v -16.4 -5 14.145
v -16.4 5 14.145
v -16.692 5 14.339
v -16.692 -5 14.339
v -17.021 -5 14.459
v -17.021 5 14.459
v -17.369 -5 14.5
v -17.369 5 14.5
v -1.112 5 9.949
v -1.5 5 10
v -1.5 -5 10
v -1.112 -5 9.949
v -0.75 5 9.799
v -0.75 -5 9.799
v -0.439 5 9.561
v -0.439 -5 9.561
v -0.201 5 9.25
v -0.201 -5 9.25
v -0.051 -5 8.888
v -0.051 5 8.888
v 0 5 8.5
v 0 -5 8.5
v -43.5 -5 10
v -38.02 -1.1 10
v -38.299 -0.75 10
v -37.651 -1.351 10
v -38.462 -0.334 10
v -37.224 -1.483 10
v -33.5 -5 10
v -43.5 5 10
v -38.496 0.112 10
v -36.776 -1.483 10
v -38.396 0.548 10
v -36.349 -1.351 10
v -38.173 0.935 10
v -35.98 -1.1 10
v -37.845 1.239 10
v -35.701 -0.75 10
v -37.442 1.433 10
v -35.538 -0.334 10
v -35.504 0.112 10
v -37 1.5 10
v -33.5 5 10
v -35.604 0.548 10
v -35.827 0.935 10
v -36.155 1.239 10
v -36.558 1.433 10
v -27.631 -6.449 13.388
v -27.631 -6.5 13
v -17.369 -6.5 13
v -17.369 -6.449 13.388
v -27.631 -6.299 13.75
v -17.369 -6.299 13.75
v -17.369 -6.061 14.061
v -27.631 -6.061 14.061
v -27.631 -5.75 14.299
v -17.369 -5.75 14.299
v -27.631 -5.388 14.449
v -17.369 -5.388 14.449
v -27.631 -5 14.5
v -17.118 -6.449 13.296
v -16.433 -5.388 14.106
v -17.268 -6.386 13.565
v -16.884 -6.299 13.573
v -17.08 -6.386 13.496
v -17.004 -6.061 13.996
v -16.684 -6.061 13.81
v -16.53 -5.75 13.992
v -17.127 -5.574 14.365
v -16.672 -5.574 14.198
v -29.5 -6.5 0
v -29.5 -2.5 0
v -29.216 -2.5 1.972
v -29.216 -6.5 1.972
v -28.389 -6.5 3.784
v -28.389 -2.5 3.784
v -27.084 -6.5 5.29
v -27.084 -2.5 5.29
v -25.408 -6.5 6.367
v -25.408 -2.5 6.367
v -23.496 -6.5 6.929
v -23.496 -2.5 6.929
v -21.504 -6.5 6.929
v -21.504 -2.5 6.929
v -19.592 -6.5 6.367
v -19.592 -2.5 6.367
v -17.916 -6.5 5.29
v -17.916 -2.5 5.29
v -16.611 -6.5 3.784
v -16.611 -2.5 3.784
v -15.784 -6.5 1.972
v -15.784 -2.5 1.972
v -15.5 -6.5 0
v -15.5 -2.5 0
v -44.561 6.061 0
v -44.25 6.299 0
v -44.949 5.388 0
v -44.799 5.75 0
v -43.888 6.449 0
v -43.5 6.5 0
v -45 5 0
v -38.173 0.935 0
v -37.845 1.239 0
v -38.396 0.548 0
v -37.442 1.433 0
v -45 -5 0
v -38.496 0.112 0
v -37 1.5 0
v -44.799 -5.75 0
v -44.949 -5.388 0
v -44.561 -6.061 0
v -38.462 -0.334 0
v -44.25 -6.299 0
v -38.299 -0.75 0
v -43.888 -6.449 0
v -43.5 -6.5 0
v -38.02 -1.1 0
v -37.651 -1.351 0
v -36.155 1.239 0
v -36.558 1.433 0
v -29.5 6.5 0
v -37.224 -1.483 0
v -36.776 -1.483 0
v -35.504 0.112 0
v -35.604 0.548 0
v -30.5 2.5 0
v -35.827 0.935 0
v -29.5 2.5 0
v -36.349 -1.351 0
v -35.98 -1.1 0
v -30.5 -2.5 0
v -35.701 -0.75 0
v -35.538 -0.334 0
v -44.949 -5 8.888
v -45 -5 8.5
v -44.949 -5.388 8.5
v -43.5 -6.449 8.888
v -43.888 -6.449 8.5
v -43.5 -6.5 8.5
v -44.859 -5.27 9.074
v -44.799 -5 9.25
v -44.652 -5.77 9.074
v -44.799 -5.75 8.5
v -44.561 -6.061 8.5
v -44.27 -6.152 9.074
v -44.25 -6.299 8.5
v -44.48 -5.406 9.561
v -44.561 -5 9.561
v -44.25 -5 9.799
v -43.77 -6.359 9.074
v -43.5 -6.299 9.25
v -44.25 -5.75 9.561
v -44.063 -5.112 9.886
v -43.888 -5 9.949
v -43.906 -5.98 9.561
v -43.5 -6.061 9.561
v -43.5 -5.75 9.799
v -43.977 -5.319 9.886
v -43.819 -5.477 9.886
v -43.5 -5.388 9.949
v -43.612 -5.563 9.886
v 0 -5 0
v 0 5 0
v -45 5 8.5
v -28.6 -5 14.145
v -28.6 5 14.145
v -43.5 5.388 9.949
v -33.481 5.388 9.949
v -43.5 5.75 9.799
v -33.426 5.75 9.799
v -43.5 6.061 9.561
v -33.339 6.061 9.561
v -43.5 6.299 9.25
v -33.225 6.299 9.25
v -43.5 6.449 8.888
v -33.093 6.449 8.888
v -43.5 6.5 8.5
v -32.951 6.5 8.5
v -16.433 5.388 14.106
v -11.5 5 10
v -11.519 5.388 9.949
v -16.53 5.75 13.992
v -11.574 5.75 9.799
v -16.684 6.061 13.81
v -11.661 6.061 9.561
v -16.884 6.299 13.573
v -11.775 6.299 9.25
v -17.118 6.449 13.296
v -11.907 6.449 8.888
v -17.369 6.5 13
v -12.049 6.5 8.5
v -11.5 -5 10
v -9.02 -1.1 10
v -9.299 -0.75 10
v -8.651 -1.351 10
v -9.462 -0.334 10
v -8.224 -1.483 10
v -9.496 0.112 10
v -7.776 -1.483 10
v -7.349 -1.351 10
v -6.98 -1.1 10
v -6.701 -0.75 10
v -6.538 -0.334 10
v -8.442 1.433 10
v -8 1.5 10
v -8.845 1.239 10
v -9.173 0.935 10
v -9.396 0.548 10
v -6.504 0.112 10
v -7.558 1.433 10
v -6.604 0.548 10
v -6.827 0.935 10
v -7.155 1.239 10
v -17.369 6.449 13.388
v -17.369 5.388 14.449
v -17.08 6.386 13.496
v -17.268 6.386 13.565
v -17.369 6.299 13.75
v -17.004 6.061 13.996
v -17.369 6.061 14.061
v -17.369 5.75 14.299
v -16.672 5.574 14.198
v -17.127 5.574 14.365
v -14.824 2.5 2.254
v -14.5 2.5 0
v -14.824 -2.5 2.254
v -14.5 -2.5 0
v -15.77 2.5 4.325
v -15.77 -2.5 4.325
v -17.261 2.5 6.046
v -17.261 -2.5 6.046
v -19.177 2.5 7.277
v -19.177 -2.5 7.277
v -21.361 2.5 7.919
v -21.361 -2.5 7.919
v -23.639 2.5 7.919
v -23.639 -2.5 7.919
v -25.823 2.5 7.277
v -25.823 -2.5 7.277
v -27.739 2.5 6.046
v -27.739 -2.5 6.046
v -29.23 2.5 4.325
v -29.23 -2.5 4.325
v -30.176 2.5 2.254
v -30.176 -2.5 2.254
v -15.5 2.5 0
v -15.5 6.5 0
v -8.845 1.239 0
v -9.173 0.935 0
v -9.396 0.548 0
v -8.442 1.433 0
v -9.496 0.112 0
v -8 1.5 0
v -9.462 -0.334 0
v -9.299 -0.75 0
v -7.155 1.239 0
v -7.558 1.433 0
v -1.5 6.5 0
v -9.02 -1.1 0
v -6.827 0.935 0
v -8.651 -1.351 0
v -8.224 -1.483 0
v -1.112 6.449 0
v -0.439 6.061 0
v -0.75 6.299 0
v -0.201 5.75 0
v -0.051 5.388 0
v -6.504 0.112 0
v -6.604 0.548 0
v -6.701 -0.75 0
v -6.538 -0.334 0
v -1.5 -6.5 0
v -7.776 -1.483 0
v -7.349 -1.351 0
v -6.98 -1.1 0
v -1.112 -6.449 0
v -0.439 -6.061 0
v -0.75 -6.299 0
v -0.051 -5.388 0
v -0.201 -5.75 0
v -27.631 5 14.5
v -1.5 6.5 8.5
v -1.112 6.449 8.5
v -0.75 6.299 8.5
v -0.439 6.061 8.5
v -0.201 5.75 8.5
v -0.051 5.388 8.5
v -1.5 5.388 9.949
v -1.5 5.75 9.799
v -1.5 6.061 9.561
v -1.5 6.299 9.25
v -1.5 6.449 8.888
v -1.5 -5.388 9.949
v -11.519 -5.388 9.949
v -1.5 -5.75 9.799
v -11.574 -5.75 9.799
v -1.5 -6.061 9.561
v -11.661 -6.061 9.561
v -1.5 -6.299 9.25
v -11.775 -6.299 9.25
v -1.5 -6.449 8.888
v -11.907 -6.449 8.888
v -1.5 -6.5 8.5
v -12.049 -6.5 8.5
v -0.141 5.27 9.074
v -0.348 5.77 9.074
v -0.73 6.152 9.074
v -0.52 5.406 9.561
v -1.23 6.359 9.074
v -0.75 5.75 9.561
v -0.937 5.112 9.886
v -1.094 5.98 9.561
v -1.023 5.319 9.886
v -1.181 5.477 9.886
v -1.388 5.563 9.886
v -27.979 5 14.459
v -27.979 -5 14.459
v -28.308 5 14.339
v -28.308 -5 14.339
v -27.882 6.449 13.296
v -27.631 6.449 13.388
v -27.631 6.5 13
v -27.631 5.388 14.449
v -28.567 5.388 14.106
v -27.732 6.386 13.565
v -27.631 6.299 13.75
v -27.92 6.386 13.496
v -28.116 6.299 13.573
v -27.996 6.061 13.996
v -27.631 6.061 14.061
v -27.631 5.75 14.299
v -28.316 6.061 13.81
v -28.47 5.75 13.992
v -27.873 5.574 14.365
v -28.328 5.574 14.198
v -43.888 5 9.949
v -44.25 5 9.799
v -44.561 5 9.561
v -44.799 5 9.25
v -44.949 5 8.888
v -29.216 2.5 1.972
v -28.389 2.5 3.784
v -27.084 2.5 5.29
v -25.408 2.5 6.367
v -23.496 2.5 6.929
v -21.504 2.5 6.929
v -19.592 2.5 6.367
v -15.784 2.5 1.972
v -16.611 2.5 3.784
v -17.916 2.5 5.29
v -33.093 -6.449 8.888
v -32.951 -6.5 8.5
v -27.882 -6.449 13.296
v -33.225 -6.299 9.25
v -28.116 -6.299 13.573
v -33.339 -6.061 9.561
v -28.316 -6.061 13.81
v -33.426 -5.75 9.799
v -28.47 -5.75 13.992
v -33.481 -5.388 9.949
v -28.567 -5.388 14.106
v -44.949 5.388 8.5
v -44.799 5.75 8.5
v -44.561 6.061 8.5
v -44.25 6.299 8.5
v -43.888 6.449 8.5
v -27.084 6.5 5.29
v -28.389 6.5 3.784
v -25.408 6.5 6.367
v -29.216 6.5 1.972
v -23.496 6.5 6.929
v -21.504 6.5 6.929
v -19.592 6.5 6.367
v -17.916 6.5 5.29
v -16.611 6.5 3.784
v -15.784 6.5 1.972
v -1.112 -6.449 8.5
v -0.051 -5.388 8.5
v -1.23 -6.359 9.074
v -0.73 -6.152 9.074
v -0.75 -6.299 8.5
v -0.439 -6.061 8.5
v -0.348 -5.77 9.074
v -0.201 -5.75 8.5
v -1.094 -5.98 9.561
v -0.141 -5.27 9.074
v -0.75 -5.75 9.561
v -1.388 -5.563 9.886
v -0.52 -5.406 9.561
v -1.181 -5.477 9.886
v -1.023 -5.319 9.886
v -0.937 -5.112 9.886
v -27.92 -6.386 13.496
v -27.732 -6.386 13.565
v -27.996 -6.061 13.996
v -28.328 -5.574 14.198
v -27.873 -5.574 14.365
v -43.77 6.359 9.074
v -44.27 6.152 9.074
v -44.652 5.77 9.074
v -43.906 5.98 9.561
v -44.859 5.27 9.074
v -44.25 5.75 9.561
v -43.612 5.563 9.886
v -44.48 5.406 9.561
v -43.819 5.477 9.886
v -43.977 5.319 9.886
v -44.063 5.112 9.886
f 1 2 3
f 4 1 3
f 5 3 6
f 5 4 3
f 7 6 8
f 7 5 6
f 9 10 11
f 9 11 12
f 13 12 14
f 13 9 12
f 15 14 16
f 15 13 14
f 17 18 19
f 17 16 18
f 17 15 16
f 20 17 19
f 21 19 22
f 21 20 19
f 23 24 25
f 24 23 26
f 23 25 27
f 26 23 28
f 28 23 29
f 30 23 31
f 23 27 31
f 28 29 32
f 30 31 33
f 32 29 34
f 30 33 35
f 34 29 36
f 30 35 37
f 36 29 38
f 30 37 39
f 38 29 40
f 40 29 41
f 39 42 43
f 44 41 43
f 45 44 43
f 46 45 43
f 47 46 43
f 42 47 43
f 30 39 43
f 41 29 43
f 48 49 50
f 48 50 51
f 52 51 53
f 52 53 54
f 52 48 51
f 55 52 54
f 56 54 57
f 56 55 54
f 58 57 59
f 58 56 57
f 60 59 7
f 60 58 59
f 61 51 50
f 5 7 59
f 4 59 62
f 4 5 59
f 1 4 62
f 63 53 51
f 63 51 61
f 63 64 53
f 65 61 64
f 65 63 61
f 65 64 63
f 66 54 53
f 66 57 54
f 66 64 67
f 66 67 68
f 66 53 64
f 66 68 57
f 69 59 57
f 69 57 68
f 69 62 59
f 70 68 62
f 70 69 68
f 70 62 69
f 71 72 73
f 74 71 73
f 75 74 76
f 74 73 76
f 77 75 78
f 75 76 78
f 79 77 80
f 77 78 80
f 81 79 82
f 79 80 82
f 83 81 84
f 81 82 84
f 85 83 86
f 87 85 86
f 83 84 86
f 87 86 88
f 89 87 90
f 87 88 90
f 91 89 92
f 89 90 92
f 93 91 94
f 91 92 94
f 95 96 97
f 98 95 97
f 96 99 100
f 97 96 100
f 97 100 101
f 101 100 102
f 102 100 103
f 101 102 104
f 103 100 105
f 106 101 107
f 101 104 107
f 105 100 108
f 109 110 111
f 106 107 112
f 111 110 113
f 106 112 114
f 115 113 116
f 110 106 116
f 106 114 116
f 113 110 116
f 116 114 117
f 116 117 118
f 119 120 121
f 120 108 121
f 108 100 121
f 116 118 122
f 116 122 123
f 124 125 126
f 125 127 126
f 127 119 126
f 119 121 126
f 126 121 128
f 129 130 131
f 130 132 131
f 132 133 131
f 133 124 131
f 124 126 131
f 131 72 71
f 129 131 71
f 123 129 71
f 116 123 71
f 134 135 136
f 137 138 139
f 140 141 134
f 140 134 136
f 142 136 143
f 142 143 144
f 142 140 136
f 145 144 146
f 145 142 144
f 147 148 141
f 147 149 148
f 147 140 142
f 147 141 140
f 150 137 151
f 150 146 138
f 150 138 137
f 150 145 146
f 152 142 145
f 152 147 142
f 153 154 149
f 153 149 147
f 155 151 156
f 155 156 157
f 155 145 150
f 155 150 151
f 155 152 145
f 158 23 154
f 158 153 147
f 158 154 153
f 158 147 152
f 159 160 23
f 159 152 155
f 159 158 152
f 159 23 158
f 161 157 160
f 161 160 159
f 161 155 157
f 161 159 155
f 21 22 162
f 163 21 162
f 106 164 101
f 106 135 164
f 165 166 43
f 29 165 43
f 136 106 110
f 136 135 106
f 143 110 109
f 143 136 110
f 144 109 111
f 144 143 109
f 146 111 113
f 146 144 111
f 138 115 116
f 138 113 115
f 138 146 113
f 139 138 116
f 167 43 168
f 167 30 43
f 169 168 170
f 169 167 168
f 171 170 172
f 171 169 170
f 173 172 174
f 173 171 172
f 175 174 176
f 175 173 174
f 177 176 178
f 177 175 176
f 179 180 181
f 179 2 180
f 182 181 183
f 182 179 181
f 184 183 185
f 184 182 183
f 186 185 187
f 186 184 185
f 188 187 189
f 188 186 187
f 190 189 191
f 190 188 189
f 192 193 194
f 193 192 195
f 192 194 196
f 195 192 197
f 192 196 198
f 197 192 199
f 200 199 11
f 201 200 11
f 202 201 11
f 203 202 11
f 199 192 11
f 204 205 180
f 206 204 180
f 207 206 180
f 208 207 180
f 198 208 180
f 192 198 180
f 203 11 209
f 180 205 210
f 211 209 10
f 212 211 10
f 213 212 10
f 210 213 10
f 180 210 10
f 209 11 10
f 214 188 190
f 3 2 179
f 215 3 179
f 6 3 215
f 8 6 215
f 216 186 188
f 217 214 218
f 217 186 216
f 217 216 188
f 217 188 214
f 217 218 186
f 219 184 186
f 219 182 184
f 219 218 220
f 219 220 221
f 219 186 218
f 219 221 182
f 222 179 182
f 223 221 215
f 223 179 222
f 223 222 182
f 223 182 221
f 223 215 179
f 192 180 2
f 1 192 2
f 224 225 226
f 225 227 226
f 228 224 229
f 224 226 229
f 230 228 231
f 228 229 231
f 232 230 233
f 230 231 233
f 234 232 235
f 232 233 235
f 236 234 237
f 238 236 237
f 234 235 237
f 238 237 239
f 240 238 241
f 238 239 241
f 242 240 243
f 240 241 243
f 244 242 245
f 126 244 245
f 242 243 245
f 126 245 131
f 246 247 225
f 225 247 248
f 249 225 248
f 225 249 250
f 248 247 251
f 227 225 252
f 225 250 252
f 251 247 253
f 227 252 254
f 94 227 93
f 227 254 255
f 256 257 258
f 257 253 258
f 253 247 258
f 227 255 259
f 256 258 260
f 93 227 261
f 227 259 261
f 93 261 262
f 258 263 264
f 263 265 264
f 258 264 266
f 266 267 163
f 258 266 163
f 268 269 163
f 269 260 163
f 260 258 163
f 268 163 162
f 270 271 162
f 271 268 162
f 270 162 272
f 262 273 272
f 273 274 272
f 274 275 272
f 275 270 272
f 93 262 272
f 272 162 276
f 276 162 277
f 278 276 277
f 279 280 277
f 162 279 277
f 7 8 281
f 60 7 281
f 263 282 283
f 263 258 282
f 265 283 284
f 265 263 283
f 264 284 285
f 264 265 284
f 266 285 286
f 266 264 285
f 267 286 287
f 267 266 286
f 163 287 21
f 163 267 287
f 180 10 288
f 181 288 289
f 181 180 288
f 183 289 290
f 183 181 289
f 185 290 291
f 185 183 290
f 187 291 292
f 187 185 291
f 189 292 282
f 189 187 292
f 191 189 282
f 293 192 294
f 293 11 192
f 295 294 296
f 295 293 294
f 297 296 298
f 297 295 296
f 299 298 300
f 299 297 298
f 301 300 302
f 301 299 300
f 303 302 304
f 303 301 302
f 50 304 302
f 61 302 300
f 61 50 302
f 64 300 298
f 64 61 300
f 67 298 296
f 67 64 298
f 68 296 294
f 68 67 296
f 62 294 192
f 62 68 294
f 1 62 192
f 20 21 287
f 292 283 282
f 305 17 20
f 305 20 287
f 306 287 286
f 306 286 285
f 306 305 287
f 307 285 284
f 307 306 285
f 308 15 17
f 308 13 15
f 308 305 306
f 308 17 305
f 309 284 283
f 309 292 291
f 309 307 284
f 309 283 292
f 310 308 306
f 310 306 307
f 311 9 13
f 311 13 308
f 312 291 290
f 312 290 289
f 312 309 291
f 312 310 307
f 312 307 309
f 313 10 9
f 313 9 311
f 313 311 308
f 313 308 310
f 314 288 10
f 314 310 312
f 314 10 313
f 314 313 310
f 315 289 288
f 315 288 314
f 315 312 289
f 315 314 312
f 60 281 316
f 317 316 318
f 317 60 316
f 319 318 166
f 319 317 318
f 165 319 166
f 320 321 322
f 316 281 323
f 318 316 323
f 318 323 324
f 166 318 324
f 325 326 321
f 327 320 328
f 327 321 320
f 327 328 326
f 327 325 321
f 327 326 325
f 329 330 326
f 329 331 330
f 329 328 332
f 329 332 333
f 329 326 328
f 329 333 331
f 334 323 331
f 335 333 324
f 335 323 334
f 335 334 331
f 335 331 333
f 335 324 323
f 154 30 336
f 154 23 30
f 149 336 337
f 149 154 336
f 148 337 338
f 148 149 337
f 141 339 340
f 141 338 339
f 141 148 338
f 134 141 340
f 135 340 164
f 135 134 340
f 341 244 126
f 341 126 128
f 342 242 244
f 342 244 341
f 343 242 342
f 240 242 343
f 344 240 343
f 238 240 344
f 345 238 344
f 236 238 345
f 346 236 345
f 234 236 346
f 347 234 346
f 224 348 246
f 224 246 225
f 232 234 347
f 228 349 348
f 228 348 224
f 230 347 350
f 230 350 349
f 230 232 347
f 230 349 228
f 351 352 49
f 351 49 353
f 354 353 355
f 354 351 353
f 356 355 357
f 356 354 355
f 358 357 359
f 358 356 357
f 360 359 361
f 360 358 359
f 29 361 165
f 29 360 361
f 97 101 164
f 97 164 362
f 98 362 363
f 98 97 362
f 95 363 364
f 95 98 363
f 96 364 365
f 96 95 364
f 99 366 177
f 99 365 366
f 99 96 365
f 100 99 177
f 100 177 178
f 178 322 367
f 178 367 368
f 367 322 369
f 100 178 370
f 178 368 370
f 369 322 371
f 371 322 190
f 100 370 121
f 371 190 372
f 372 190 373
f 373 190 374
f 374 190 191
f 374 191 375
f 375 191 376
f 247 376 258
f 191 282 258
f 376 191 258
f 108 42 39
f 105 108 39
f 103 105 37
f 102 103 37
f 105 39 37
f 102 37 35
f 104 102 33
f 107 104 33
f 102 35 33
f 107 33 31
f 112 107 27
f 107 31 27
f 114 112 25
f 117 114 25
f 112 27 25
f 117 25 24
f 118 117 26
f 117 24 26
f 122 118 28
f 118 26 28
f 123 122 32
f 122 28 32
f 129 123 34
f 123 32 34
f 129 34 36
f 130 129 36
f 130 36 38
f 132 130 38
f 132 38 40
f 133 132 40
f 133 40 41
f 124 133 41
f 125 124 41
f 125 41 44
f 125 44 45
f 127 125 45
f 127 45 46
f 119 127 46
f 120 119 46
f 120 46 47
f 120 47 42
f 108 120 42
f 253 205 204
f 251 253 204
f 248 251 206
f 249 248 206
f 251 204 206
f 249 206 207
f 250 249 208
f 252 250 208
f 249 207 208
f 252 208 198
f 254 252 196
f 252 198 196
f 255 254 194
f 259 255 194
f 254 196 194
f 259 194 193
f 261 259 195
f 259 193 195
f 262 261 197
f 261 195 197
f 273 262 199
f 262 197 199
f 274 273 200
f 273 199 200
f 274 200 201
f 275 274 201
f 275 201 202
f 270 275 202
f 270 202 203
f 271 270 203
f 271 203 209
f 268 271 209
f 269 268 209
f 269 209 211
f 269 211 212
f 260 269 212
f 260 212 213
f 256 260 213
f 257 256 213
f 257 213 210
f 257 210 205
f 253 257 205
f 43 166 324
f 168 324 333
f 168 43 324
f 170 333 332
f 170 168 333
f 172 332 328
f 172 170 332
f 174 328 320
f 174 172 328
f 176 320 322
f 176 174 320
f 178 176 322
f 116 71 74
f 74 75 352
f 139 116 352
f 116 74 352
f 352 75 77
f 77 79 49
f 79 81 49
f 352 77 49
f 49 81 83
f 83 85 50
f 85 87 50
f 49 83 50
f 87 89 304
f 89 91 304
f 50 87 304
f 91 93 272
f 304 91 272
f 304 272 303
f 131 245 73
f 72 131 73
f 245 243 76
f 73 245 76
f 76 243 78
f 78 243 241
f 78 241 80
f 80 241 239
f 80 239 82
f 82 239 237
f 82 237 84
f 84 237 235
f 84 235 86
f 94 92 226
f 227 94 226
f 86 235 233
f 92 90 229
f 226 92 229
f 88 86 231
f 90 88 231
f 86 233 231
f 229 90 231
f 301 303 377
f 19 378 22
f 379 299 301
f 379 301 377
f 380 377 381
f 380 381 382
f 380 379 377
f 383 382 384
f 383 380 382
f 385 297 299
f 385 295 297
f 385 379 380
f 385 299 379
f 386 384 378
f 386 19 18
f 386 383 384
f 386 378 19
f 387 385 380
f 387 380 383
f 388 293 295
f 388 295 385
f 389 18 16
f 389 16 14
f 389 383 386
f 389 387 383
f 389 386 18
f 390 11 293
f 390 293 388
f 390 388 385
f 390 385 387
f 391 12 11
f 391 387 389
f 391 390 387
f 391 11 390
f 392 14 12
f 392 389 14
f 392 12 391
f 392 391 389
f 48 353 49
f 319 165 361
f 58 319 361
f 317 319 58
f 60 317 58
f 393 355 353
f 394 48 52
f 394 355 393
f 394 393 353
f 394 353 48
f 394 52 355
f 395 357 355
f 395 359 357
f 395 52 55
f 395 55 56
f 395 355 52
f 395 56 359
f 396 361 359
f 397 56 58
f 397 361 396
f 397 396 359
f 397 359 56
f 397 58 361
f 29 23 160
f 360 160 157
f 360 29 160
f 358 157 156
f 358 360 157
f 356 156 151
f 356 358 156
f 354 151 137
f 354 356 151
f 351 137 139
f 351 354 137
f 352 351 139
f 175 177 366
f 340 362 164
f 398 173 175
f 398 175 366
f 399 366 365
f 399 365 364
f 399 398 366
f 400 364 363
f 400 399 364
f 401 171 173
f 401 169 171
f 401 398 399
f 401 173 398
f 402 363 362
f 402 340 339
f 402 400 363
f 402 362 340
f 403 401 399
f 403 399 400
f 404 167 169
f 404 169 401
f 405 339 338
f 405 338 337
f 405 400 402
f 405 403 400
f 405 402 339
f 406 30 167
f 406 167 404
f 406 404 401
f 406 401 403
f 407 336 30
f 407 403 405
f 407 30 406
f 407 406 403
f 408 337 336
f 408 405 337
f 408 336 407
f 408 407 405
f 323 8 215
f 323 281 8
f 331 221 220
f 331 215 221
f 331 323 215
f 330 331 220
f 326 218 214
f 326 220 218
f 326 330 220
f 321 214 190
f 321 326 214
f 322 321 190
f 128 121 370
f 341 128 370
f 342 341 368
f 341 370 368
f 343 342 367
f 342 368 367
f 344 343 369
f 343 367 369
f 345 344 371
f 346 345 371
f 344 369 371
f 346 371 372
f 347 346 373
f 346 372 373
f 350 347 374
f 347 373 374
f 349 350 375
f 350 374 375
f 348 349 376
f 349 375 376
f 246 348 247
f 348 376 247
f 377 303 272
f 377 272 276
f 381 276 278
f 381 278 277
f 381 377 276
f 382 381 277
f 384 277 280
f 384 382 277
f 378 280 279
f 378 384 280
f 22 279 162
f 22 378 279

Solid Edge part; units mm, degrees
sketch "Sketch1" plane through (0, 0, 0) normal (1, 0, 0) x (0, 1, 0)
  line L0 (6.5, 10) -> (6.5, 0)
  line L1 (6.5, 0) -> (-6.5, 0)
  line L2 (-6.5, 0) -> (-6.5, 10)
  line L3 (-6.5, 10) -> (6.5, 10)
extrude "Protrusion1" add sketch "Sketch1" against normal blind 45
fillet "Redondeo_1" radius 1.5 4 edges at (0, -6.5, 5) (-45, -6.5, 5) (-45, 6.5, 5) (0, 6.5, 5)
sketch "Sketch2" plane through (-22.25, 6.5, 6.5) normal (0, 1, 0) x (0, 0, -1)
  circle A0 centre (6.5, 0.25) radius 7
extrude "Cutout1" cut sketch "Sketch2" against normal through all
sketch "Sketch3" plane through (-22.25, 6.5, 6.5) normal (0, 1, 0) x (-1, 0, 0)
  line L0 (-5.4308, 8) -> (5.9308, 8)
  line L1 (5.9308, 8) -> (11.25, 3.5)
  line L2 (11.25, 3.5) -> (-10.75, 3.5)
  line L3 (-10.75, 3.5) -> (-5.4308, 8)
extrude "ProtrusiónExtruida_2" add sketch "Sketch3" against normal blind 13
fillet "Redondeo_2" radius 1.5 17 edges at (-6.5, 6.5, 10) (-0.4393, 6.0607, 10) (0, 0, 10) (-0.4393, -6.0607, 10) (-6.5, -6.5, 10) (-38.5, 6.5, 10) (-45, 0, 10) (-44.5607, -6.0607, 10) (-38.5, -6.5, 10) (-14.1596, 6.5, 12.25) (-14.1596, -6.5, 12.25) (-16.8192, 0, 14.5) (-22.5, 6.5, 14.5) (-28.1808, 0, 14.5) (-22.5, -6.5, 14.5) (-30.8404, -6.5, 12.25) (-30.8404, 6.5, 12.25)
sketch "Sketch4" plane through (-7.25, 0, 10) normal (0, 0, 1) x (0, 1, 0)
  circle A0 centre (0, 0.75) radius 1.5
  circle A1 centre (0, 29.75) radius 1.5
  dimension "D1" = 8
  dimension "D2" = 8
extrude "Cutout2" cut sketch "Sketch4" against normal through all
sketch "Sketch5" plane through (0, 0, 0) normal (0, 0, 1) x (1, 0, 0)
  line L0 (-22.5, 2.5) -> (-14.5, 2.5)
  line L1 (-14.5, 2.5) -> (-14.5, -2.5)
  line L2 (-14.5, -2.5) -> (-22.5, -2.5)
  line L3 (-22.5, -2.5) -> (-22.5, 2.5)
revolve "RevolvedCutout1" cut sketch "Sketch5" angle 360 about axis through (-22.5, 8, 0) along (0, -1, 0)
